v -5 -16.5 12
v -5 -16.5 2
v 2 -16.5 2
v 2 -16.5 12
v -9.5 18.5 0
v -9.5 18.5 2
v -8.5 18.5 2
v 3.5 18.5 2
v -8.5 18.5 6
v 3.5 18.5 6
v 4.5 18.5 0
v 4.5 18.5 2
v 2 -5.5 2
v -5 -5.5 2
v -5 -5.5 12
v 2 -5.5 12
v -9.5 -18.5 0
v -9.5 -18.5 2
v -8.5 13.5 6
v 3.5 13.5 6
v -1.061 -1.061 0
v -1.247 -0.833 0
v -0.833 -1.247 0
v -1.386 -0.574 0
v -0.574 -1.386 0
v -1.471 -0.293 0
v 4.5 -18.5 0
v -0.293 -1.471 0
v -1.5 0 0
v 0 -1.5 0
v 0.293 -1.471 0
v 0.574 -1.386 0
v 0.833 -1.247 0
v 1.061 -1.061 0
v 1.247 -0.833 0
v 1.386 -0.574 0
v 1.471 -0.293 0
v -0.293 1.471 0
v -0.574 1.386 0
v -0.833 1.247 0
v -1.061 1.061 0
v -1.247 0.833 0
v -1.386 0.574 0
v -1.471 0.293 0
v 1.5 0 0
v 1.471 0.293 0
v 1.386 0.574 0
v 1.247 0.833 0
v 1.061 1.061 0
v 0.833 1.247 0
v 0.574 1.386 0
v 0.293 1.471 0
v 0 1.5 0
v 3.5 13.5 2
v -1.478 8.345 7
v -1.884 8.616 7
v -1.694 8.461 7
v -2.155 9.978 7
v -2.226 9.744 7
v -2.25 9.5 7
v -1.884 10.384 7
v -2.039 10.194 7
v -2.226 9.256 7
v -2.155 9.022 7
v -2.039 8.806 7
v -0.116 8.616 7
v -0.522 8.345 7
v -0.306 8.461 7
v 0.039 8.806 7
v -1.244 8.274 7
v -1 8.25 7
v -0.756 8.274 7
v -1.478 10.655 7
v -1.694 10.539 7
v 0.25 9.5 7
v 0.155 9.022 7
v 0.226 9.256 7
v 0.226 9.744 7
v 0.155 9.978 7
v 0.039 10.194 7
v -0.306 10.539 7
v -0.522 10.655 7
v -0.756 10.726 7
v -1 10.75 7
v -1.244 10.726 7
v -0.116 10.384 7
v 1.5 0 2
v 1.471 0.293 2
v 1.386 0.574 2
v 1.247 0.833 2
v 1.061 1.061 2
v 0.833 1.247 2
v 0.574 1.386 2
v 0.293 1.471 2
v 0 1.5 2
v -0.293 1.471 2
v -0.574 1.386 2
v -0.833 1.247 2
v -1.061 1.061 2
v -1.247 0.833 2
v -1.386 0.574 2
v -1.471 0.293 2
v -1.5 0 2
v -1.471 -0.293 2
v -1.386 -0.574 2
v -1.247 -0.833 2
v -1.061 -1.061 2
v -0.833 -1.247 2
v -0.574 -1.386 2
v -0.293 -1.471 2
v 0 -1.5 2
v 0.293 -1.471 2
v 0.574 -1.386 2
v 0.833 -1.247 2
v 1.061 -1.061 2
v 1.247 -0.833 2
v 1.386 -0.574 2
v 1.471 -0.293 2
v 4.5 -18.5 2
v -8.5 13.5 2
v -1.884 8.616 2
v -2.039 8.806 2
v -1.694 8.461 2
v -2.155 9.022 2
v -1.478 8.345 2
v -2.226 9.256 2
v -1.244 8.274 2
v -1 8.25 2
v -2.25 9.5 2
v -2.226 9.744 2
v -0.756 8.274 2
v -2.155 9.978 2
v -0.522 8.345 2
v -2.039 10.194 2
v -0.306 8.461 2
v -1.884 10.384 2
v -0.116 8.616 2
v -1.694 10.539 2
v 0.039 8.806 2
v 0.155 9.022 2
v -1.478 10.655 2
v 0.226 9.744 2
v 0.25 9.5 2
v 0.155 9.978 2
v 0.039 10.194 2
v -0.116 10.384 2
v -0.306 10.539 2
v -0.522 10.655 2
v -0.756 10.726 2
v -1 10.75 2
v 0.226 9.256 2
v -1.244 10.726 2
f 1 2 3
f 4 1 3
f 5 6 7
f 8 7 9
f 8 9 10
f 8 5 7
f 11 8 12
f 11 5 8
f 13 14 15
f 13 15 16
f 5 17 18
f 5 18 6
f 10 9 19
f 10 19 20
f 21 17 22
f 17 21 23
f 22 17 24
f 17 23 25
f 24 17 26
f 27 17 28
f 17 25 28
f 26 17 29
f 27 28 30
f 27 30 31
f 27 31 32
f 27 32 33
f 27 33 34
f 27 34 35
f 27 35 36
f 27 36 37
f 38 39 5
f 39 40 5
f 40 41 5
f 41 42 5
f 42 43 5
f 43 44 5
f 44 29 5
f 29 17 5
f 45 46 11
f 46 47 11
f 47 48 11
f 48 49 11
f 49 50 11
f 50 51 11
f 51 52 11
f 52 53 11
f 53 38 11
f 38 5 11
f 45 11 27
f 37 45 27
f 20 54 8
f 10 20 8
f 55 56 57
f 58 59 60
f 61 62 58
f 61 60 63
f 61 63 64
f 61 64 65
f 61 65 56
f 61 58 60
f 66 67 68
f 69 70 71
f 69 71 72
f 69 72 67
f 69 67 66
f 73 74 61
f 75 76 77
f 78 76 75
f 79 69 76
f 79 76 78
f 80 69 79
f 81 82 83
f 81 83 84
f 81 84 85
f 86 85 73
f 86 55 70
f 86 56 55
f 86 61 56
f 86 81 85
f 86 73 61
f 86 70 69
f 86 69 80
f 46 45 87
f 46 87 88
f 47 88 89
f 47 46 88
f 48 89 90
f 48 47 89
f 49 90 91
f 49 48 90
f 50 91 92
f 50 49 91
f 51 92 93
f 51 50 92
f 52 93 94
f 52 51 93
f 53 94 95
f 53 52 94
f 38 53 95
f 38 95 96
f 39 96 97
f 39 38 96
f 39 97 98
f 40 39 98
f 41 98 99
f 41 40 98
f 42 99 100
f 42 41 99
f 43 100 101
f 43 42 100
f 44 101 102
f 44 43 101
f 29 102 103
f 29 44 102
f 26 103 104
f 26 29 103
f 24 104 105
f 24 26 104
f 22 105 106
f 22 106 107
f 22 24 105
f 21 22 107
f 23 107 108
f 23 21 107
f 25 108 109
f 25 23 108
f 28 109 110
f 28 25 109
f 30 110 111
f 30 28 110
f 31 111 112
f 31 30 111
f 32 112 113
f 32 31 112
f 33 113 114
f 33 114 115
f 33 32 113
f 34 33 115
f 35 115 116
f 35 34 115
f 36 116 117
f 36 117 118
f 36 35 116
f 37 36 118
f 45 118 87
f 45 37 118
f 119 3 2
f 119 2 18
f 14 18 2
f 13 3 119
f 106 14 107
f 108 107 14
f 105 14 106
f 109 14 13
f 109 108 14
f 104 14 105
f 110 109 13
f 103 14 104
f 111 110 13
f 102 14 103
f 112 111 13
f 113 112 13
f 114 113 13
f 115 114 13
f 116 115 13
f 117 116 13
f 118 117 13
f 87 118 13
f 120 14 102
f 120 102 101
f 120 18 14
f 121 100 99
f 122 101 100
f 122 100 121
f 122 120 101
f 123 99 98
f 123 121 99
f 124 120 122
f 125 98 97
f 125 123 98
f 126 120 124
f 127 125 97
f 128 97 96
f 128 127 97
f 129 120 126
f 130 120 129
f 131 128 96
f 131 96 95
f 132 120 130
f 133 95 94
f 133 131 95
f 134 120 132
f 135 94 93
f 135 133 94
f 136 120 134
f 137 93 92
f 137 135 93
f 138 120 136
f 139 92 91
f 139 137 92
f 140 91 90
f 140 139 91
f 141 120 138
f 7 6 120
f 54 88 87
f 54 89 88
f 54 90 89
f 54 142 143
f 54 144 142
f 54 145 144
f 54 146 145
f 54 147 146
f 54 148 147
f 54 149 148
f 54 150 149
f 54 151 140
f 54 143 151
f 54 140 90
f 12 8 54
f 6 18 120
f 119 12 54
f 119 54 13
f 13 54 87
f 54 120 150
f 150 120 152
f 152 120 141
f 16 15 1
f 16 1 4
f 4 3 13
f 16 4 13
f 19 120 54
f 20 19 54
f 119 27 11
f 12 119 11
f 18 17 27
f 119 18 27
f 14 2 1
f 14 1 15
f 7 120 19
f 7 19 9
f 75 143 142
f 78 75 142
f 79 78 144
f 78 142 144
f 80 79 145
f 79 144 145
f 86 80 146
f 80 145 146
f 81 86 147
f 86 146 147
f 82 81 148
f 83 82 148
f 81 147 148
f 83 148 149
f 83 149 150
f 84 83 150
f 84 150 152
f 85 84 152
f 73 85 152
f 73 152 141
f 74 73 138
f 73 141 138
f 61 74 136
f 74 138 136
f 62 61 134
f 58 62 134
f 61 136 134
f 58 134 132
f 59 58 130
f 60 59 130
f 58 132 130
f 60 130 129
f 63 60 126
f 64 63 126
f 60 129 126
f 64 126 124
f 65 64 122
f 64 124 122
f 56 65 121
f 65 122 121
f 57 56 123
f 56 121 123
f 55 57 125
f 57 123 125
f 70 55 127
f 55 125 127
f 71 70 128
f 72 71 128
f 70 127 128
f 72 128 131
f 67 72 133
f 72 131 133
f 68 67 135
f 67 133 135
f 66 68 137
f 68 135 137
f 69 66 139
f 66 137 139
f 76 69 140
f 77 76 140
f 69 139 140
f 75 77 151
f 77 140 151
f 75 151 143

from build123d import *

# Parameters (mm, degrees)
F0_W     = 14
F0_H     = 37
F0_R     = 1.5
F1_DEPTH = 2
F2_W     = 12
F2_H     = 5
F3_DEPTH = 4
F4_R     = 1.25
F5_DEPTH = 5
F6_W     = 7
F6_H     = 11
F7_DEPTH = 10


with BuildPart() as f1:
    # F0 (on Top) → F1 (new body)
    with BuildSketch(Plane.XY):
        with Locations((-2.5, 0)):
            Rectangle(F0_W, F0_H)
        Circle(F0_R, mode=Mode.SUBTRACT)
    extrude(amount=F1_DEPTH)

    # F2 (on face) → F3 (join)
    with BuildSketch(Plane.XY.offset(2)):
        with Locations((-2.5, 16)):
            Rectangle(F2_W, F2_H)
    extrude(amount=F3_DEPTH)

    # F4 (on face) → F5 (join)
    with BuildSketch(Plane.XY.offset(2)):
        with Locations((-1, 9.5)):
            Circle(F4_R)
    extrude(amount=F5_DEPTH)

    # F6 (on face) → F7 (join)
    with BuildSketch(Plane.XY.offset(2)):
        with Locations((-1.5, -11)):
            Rectangle(F6_W, F6_H)
    extrude(amount=F7_DEPTH)


solid = f1.part
